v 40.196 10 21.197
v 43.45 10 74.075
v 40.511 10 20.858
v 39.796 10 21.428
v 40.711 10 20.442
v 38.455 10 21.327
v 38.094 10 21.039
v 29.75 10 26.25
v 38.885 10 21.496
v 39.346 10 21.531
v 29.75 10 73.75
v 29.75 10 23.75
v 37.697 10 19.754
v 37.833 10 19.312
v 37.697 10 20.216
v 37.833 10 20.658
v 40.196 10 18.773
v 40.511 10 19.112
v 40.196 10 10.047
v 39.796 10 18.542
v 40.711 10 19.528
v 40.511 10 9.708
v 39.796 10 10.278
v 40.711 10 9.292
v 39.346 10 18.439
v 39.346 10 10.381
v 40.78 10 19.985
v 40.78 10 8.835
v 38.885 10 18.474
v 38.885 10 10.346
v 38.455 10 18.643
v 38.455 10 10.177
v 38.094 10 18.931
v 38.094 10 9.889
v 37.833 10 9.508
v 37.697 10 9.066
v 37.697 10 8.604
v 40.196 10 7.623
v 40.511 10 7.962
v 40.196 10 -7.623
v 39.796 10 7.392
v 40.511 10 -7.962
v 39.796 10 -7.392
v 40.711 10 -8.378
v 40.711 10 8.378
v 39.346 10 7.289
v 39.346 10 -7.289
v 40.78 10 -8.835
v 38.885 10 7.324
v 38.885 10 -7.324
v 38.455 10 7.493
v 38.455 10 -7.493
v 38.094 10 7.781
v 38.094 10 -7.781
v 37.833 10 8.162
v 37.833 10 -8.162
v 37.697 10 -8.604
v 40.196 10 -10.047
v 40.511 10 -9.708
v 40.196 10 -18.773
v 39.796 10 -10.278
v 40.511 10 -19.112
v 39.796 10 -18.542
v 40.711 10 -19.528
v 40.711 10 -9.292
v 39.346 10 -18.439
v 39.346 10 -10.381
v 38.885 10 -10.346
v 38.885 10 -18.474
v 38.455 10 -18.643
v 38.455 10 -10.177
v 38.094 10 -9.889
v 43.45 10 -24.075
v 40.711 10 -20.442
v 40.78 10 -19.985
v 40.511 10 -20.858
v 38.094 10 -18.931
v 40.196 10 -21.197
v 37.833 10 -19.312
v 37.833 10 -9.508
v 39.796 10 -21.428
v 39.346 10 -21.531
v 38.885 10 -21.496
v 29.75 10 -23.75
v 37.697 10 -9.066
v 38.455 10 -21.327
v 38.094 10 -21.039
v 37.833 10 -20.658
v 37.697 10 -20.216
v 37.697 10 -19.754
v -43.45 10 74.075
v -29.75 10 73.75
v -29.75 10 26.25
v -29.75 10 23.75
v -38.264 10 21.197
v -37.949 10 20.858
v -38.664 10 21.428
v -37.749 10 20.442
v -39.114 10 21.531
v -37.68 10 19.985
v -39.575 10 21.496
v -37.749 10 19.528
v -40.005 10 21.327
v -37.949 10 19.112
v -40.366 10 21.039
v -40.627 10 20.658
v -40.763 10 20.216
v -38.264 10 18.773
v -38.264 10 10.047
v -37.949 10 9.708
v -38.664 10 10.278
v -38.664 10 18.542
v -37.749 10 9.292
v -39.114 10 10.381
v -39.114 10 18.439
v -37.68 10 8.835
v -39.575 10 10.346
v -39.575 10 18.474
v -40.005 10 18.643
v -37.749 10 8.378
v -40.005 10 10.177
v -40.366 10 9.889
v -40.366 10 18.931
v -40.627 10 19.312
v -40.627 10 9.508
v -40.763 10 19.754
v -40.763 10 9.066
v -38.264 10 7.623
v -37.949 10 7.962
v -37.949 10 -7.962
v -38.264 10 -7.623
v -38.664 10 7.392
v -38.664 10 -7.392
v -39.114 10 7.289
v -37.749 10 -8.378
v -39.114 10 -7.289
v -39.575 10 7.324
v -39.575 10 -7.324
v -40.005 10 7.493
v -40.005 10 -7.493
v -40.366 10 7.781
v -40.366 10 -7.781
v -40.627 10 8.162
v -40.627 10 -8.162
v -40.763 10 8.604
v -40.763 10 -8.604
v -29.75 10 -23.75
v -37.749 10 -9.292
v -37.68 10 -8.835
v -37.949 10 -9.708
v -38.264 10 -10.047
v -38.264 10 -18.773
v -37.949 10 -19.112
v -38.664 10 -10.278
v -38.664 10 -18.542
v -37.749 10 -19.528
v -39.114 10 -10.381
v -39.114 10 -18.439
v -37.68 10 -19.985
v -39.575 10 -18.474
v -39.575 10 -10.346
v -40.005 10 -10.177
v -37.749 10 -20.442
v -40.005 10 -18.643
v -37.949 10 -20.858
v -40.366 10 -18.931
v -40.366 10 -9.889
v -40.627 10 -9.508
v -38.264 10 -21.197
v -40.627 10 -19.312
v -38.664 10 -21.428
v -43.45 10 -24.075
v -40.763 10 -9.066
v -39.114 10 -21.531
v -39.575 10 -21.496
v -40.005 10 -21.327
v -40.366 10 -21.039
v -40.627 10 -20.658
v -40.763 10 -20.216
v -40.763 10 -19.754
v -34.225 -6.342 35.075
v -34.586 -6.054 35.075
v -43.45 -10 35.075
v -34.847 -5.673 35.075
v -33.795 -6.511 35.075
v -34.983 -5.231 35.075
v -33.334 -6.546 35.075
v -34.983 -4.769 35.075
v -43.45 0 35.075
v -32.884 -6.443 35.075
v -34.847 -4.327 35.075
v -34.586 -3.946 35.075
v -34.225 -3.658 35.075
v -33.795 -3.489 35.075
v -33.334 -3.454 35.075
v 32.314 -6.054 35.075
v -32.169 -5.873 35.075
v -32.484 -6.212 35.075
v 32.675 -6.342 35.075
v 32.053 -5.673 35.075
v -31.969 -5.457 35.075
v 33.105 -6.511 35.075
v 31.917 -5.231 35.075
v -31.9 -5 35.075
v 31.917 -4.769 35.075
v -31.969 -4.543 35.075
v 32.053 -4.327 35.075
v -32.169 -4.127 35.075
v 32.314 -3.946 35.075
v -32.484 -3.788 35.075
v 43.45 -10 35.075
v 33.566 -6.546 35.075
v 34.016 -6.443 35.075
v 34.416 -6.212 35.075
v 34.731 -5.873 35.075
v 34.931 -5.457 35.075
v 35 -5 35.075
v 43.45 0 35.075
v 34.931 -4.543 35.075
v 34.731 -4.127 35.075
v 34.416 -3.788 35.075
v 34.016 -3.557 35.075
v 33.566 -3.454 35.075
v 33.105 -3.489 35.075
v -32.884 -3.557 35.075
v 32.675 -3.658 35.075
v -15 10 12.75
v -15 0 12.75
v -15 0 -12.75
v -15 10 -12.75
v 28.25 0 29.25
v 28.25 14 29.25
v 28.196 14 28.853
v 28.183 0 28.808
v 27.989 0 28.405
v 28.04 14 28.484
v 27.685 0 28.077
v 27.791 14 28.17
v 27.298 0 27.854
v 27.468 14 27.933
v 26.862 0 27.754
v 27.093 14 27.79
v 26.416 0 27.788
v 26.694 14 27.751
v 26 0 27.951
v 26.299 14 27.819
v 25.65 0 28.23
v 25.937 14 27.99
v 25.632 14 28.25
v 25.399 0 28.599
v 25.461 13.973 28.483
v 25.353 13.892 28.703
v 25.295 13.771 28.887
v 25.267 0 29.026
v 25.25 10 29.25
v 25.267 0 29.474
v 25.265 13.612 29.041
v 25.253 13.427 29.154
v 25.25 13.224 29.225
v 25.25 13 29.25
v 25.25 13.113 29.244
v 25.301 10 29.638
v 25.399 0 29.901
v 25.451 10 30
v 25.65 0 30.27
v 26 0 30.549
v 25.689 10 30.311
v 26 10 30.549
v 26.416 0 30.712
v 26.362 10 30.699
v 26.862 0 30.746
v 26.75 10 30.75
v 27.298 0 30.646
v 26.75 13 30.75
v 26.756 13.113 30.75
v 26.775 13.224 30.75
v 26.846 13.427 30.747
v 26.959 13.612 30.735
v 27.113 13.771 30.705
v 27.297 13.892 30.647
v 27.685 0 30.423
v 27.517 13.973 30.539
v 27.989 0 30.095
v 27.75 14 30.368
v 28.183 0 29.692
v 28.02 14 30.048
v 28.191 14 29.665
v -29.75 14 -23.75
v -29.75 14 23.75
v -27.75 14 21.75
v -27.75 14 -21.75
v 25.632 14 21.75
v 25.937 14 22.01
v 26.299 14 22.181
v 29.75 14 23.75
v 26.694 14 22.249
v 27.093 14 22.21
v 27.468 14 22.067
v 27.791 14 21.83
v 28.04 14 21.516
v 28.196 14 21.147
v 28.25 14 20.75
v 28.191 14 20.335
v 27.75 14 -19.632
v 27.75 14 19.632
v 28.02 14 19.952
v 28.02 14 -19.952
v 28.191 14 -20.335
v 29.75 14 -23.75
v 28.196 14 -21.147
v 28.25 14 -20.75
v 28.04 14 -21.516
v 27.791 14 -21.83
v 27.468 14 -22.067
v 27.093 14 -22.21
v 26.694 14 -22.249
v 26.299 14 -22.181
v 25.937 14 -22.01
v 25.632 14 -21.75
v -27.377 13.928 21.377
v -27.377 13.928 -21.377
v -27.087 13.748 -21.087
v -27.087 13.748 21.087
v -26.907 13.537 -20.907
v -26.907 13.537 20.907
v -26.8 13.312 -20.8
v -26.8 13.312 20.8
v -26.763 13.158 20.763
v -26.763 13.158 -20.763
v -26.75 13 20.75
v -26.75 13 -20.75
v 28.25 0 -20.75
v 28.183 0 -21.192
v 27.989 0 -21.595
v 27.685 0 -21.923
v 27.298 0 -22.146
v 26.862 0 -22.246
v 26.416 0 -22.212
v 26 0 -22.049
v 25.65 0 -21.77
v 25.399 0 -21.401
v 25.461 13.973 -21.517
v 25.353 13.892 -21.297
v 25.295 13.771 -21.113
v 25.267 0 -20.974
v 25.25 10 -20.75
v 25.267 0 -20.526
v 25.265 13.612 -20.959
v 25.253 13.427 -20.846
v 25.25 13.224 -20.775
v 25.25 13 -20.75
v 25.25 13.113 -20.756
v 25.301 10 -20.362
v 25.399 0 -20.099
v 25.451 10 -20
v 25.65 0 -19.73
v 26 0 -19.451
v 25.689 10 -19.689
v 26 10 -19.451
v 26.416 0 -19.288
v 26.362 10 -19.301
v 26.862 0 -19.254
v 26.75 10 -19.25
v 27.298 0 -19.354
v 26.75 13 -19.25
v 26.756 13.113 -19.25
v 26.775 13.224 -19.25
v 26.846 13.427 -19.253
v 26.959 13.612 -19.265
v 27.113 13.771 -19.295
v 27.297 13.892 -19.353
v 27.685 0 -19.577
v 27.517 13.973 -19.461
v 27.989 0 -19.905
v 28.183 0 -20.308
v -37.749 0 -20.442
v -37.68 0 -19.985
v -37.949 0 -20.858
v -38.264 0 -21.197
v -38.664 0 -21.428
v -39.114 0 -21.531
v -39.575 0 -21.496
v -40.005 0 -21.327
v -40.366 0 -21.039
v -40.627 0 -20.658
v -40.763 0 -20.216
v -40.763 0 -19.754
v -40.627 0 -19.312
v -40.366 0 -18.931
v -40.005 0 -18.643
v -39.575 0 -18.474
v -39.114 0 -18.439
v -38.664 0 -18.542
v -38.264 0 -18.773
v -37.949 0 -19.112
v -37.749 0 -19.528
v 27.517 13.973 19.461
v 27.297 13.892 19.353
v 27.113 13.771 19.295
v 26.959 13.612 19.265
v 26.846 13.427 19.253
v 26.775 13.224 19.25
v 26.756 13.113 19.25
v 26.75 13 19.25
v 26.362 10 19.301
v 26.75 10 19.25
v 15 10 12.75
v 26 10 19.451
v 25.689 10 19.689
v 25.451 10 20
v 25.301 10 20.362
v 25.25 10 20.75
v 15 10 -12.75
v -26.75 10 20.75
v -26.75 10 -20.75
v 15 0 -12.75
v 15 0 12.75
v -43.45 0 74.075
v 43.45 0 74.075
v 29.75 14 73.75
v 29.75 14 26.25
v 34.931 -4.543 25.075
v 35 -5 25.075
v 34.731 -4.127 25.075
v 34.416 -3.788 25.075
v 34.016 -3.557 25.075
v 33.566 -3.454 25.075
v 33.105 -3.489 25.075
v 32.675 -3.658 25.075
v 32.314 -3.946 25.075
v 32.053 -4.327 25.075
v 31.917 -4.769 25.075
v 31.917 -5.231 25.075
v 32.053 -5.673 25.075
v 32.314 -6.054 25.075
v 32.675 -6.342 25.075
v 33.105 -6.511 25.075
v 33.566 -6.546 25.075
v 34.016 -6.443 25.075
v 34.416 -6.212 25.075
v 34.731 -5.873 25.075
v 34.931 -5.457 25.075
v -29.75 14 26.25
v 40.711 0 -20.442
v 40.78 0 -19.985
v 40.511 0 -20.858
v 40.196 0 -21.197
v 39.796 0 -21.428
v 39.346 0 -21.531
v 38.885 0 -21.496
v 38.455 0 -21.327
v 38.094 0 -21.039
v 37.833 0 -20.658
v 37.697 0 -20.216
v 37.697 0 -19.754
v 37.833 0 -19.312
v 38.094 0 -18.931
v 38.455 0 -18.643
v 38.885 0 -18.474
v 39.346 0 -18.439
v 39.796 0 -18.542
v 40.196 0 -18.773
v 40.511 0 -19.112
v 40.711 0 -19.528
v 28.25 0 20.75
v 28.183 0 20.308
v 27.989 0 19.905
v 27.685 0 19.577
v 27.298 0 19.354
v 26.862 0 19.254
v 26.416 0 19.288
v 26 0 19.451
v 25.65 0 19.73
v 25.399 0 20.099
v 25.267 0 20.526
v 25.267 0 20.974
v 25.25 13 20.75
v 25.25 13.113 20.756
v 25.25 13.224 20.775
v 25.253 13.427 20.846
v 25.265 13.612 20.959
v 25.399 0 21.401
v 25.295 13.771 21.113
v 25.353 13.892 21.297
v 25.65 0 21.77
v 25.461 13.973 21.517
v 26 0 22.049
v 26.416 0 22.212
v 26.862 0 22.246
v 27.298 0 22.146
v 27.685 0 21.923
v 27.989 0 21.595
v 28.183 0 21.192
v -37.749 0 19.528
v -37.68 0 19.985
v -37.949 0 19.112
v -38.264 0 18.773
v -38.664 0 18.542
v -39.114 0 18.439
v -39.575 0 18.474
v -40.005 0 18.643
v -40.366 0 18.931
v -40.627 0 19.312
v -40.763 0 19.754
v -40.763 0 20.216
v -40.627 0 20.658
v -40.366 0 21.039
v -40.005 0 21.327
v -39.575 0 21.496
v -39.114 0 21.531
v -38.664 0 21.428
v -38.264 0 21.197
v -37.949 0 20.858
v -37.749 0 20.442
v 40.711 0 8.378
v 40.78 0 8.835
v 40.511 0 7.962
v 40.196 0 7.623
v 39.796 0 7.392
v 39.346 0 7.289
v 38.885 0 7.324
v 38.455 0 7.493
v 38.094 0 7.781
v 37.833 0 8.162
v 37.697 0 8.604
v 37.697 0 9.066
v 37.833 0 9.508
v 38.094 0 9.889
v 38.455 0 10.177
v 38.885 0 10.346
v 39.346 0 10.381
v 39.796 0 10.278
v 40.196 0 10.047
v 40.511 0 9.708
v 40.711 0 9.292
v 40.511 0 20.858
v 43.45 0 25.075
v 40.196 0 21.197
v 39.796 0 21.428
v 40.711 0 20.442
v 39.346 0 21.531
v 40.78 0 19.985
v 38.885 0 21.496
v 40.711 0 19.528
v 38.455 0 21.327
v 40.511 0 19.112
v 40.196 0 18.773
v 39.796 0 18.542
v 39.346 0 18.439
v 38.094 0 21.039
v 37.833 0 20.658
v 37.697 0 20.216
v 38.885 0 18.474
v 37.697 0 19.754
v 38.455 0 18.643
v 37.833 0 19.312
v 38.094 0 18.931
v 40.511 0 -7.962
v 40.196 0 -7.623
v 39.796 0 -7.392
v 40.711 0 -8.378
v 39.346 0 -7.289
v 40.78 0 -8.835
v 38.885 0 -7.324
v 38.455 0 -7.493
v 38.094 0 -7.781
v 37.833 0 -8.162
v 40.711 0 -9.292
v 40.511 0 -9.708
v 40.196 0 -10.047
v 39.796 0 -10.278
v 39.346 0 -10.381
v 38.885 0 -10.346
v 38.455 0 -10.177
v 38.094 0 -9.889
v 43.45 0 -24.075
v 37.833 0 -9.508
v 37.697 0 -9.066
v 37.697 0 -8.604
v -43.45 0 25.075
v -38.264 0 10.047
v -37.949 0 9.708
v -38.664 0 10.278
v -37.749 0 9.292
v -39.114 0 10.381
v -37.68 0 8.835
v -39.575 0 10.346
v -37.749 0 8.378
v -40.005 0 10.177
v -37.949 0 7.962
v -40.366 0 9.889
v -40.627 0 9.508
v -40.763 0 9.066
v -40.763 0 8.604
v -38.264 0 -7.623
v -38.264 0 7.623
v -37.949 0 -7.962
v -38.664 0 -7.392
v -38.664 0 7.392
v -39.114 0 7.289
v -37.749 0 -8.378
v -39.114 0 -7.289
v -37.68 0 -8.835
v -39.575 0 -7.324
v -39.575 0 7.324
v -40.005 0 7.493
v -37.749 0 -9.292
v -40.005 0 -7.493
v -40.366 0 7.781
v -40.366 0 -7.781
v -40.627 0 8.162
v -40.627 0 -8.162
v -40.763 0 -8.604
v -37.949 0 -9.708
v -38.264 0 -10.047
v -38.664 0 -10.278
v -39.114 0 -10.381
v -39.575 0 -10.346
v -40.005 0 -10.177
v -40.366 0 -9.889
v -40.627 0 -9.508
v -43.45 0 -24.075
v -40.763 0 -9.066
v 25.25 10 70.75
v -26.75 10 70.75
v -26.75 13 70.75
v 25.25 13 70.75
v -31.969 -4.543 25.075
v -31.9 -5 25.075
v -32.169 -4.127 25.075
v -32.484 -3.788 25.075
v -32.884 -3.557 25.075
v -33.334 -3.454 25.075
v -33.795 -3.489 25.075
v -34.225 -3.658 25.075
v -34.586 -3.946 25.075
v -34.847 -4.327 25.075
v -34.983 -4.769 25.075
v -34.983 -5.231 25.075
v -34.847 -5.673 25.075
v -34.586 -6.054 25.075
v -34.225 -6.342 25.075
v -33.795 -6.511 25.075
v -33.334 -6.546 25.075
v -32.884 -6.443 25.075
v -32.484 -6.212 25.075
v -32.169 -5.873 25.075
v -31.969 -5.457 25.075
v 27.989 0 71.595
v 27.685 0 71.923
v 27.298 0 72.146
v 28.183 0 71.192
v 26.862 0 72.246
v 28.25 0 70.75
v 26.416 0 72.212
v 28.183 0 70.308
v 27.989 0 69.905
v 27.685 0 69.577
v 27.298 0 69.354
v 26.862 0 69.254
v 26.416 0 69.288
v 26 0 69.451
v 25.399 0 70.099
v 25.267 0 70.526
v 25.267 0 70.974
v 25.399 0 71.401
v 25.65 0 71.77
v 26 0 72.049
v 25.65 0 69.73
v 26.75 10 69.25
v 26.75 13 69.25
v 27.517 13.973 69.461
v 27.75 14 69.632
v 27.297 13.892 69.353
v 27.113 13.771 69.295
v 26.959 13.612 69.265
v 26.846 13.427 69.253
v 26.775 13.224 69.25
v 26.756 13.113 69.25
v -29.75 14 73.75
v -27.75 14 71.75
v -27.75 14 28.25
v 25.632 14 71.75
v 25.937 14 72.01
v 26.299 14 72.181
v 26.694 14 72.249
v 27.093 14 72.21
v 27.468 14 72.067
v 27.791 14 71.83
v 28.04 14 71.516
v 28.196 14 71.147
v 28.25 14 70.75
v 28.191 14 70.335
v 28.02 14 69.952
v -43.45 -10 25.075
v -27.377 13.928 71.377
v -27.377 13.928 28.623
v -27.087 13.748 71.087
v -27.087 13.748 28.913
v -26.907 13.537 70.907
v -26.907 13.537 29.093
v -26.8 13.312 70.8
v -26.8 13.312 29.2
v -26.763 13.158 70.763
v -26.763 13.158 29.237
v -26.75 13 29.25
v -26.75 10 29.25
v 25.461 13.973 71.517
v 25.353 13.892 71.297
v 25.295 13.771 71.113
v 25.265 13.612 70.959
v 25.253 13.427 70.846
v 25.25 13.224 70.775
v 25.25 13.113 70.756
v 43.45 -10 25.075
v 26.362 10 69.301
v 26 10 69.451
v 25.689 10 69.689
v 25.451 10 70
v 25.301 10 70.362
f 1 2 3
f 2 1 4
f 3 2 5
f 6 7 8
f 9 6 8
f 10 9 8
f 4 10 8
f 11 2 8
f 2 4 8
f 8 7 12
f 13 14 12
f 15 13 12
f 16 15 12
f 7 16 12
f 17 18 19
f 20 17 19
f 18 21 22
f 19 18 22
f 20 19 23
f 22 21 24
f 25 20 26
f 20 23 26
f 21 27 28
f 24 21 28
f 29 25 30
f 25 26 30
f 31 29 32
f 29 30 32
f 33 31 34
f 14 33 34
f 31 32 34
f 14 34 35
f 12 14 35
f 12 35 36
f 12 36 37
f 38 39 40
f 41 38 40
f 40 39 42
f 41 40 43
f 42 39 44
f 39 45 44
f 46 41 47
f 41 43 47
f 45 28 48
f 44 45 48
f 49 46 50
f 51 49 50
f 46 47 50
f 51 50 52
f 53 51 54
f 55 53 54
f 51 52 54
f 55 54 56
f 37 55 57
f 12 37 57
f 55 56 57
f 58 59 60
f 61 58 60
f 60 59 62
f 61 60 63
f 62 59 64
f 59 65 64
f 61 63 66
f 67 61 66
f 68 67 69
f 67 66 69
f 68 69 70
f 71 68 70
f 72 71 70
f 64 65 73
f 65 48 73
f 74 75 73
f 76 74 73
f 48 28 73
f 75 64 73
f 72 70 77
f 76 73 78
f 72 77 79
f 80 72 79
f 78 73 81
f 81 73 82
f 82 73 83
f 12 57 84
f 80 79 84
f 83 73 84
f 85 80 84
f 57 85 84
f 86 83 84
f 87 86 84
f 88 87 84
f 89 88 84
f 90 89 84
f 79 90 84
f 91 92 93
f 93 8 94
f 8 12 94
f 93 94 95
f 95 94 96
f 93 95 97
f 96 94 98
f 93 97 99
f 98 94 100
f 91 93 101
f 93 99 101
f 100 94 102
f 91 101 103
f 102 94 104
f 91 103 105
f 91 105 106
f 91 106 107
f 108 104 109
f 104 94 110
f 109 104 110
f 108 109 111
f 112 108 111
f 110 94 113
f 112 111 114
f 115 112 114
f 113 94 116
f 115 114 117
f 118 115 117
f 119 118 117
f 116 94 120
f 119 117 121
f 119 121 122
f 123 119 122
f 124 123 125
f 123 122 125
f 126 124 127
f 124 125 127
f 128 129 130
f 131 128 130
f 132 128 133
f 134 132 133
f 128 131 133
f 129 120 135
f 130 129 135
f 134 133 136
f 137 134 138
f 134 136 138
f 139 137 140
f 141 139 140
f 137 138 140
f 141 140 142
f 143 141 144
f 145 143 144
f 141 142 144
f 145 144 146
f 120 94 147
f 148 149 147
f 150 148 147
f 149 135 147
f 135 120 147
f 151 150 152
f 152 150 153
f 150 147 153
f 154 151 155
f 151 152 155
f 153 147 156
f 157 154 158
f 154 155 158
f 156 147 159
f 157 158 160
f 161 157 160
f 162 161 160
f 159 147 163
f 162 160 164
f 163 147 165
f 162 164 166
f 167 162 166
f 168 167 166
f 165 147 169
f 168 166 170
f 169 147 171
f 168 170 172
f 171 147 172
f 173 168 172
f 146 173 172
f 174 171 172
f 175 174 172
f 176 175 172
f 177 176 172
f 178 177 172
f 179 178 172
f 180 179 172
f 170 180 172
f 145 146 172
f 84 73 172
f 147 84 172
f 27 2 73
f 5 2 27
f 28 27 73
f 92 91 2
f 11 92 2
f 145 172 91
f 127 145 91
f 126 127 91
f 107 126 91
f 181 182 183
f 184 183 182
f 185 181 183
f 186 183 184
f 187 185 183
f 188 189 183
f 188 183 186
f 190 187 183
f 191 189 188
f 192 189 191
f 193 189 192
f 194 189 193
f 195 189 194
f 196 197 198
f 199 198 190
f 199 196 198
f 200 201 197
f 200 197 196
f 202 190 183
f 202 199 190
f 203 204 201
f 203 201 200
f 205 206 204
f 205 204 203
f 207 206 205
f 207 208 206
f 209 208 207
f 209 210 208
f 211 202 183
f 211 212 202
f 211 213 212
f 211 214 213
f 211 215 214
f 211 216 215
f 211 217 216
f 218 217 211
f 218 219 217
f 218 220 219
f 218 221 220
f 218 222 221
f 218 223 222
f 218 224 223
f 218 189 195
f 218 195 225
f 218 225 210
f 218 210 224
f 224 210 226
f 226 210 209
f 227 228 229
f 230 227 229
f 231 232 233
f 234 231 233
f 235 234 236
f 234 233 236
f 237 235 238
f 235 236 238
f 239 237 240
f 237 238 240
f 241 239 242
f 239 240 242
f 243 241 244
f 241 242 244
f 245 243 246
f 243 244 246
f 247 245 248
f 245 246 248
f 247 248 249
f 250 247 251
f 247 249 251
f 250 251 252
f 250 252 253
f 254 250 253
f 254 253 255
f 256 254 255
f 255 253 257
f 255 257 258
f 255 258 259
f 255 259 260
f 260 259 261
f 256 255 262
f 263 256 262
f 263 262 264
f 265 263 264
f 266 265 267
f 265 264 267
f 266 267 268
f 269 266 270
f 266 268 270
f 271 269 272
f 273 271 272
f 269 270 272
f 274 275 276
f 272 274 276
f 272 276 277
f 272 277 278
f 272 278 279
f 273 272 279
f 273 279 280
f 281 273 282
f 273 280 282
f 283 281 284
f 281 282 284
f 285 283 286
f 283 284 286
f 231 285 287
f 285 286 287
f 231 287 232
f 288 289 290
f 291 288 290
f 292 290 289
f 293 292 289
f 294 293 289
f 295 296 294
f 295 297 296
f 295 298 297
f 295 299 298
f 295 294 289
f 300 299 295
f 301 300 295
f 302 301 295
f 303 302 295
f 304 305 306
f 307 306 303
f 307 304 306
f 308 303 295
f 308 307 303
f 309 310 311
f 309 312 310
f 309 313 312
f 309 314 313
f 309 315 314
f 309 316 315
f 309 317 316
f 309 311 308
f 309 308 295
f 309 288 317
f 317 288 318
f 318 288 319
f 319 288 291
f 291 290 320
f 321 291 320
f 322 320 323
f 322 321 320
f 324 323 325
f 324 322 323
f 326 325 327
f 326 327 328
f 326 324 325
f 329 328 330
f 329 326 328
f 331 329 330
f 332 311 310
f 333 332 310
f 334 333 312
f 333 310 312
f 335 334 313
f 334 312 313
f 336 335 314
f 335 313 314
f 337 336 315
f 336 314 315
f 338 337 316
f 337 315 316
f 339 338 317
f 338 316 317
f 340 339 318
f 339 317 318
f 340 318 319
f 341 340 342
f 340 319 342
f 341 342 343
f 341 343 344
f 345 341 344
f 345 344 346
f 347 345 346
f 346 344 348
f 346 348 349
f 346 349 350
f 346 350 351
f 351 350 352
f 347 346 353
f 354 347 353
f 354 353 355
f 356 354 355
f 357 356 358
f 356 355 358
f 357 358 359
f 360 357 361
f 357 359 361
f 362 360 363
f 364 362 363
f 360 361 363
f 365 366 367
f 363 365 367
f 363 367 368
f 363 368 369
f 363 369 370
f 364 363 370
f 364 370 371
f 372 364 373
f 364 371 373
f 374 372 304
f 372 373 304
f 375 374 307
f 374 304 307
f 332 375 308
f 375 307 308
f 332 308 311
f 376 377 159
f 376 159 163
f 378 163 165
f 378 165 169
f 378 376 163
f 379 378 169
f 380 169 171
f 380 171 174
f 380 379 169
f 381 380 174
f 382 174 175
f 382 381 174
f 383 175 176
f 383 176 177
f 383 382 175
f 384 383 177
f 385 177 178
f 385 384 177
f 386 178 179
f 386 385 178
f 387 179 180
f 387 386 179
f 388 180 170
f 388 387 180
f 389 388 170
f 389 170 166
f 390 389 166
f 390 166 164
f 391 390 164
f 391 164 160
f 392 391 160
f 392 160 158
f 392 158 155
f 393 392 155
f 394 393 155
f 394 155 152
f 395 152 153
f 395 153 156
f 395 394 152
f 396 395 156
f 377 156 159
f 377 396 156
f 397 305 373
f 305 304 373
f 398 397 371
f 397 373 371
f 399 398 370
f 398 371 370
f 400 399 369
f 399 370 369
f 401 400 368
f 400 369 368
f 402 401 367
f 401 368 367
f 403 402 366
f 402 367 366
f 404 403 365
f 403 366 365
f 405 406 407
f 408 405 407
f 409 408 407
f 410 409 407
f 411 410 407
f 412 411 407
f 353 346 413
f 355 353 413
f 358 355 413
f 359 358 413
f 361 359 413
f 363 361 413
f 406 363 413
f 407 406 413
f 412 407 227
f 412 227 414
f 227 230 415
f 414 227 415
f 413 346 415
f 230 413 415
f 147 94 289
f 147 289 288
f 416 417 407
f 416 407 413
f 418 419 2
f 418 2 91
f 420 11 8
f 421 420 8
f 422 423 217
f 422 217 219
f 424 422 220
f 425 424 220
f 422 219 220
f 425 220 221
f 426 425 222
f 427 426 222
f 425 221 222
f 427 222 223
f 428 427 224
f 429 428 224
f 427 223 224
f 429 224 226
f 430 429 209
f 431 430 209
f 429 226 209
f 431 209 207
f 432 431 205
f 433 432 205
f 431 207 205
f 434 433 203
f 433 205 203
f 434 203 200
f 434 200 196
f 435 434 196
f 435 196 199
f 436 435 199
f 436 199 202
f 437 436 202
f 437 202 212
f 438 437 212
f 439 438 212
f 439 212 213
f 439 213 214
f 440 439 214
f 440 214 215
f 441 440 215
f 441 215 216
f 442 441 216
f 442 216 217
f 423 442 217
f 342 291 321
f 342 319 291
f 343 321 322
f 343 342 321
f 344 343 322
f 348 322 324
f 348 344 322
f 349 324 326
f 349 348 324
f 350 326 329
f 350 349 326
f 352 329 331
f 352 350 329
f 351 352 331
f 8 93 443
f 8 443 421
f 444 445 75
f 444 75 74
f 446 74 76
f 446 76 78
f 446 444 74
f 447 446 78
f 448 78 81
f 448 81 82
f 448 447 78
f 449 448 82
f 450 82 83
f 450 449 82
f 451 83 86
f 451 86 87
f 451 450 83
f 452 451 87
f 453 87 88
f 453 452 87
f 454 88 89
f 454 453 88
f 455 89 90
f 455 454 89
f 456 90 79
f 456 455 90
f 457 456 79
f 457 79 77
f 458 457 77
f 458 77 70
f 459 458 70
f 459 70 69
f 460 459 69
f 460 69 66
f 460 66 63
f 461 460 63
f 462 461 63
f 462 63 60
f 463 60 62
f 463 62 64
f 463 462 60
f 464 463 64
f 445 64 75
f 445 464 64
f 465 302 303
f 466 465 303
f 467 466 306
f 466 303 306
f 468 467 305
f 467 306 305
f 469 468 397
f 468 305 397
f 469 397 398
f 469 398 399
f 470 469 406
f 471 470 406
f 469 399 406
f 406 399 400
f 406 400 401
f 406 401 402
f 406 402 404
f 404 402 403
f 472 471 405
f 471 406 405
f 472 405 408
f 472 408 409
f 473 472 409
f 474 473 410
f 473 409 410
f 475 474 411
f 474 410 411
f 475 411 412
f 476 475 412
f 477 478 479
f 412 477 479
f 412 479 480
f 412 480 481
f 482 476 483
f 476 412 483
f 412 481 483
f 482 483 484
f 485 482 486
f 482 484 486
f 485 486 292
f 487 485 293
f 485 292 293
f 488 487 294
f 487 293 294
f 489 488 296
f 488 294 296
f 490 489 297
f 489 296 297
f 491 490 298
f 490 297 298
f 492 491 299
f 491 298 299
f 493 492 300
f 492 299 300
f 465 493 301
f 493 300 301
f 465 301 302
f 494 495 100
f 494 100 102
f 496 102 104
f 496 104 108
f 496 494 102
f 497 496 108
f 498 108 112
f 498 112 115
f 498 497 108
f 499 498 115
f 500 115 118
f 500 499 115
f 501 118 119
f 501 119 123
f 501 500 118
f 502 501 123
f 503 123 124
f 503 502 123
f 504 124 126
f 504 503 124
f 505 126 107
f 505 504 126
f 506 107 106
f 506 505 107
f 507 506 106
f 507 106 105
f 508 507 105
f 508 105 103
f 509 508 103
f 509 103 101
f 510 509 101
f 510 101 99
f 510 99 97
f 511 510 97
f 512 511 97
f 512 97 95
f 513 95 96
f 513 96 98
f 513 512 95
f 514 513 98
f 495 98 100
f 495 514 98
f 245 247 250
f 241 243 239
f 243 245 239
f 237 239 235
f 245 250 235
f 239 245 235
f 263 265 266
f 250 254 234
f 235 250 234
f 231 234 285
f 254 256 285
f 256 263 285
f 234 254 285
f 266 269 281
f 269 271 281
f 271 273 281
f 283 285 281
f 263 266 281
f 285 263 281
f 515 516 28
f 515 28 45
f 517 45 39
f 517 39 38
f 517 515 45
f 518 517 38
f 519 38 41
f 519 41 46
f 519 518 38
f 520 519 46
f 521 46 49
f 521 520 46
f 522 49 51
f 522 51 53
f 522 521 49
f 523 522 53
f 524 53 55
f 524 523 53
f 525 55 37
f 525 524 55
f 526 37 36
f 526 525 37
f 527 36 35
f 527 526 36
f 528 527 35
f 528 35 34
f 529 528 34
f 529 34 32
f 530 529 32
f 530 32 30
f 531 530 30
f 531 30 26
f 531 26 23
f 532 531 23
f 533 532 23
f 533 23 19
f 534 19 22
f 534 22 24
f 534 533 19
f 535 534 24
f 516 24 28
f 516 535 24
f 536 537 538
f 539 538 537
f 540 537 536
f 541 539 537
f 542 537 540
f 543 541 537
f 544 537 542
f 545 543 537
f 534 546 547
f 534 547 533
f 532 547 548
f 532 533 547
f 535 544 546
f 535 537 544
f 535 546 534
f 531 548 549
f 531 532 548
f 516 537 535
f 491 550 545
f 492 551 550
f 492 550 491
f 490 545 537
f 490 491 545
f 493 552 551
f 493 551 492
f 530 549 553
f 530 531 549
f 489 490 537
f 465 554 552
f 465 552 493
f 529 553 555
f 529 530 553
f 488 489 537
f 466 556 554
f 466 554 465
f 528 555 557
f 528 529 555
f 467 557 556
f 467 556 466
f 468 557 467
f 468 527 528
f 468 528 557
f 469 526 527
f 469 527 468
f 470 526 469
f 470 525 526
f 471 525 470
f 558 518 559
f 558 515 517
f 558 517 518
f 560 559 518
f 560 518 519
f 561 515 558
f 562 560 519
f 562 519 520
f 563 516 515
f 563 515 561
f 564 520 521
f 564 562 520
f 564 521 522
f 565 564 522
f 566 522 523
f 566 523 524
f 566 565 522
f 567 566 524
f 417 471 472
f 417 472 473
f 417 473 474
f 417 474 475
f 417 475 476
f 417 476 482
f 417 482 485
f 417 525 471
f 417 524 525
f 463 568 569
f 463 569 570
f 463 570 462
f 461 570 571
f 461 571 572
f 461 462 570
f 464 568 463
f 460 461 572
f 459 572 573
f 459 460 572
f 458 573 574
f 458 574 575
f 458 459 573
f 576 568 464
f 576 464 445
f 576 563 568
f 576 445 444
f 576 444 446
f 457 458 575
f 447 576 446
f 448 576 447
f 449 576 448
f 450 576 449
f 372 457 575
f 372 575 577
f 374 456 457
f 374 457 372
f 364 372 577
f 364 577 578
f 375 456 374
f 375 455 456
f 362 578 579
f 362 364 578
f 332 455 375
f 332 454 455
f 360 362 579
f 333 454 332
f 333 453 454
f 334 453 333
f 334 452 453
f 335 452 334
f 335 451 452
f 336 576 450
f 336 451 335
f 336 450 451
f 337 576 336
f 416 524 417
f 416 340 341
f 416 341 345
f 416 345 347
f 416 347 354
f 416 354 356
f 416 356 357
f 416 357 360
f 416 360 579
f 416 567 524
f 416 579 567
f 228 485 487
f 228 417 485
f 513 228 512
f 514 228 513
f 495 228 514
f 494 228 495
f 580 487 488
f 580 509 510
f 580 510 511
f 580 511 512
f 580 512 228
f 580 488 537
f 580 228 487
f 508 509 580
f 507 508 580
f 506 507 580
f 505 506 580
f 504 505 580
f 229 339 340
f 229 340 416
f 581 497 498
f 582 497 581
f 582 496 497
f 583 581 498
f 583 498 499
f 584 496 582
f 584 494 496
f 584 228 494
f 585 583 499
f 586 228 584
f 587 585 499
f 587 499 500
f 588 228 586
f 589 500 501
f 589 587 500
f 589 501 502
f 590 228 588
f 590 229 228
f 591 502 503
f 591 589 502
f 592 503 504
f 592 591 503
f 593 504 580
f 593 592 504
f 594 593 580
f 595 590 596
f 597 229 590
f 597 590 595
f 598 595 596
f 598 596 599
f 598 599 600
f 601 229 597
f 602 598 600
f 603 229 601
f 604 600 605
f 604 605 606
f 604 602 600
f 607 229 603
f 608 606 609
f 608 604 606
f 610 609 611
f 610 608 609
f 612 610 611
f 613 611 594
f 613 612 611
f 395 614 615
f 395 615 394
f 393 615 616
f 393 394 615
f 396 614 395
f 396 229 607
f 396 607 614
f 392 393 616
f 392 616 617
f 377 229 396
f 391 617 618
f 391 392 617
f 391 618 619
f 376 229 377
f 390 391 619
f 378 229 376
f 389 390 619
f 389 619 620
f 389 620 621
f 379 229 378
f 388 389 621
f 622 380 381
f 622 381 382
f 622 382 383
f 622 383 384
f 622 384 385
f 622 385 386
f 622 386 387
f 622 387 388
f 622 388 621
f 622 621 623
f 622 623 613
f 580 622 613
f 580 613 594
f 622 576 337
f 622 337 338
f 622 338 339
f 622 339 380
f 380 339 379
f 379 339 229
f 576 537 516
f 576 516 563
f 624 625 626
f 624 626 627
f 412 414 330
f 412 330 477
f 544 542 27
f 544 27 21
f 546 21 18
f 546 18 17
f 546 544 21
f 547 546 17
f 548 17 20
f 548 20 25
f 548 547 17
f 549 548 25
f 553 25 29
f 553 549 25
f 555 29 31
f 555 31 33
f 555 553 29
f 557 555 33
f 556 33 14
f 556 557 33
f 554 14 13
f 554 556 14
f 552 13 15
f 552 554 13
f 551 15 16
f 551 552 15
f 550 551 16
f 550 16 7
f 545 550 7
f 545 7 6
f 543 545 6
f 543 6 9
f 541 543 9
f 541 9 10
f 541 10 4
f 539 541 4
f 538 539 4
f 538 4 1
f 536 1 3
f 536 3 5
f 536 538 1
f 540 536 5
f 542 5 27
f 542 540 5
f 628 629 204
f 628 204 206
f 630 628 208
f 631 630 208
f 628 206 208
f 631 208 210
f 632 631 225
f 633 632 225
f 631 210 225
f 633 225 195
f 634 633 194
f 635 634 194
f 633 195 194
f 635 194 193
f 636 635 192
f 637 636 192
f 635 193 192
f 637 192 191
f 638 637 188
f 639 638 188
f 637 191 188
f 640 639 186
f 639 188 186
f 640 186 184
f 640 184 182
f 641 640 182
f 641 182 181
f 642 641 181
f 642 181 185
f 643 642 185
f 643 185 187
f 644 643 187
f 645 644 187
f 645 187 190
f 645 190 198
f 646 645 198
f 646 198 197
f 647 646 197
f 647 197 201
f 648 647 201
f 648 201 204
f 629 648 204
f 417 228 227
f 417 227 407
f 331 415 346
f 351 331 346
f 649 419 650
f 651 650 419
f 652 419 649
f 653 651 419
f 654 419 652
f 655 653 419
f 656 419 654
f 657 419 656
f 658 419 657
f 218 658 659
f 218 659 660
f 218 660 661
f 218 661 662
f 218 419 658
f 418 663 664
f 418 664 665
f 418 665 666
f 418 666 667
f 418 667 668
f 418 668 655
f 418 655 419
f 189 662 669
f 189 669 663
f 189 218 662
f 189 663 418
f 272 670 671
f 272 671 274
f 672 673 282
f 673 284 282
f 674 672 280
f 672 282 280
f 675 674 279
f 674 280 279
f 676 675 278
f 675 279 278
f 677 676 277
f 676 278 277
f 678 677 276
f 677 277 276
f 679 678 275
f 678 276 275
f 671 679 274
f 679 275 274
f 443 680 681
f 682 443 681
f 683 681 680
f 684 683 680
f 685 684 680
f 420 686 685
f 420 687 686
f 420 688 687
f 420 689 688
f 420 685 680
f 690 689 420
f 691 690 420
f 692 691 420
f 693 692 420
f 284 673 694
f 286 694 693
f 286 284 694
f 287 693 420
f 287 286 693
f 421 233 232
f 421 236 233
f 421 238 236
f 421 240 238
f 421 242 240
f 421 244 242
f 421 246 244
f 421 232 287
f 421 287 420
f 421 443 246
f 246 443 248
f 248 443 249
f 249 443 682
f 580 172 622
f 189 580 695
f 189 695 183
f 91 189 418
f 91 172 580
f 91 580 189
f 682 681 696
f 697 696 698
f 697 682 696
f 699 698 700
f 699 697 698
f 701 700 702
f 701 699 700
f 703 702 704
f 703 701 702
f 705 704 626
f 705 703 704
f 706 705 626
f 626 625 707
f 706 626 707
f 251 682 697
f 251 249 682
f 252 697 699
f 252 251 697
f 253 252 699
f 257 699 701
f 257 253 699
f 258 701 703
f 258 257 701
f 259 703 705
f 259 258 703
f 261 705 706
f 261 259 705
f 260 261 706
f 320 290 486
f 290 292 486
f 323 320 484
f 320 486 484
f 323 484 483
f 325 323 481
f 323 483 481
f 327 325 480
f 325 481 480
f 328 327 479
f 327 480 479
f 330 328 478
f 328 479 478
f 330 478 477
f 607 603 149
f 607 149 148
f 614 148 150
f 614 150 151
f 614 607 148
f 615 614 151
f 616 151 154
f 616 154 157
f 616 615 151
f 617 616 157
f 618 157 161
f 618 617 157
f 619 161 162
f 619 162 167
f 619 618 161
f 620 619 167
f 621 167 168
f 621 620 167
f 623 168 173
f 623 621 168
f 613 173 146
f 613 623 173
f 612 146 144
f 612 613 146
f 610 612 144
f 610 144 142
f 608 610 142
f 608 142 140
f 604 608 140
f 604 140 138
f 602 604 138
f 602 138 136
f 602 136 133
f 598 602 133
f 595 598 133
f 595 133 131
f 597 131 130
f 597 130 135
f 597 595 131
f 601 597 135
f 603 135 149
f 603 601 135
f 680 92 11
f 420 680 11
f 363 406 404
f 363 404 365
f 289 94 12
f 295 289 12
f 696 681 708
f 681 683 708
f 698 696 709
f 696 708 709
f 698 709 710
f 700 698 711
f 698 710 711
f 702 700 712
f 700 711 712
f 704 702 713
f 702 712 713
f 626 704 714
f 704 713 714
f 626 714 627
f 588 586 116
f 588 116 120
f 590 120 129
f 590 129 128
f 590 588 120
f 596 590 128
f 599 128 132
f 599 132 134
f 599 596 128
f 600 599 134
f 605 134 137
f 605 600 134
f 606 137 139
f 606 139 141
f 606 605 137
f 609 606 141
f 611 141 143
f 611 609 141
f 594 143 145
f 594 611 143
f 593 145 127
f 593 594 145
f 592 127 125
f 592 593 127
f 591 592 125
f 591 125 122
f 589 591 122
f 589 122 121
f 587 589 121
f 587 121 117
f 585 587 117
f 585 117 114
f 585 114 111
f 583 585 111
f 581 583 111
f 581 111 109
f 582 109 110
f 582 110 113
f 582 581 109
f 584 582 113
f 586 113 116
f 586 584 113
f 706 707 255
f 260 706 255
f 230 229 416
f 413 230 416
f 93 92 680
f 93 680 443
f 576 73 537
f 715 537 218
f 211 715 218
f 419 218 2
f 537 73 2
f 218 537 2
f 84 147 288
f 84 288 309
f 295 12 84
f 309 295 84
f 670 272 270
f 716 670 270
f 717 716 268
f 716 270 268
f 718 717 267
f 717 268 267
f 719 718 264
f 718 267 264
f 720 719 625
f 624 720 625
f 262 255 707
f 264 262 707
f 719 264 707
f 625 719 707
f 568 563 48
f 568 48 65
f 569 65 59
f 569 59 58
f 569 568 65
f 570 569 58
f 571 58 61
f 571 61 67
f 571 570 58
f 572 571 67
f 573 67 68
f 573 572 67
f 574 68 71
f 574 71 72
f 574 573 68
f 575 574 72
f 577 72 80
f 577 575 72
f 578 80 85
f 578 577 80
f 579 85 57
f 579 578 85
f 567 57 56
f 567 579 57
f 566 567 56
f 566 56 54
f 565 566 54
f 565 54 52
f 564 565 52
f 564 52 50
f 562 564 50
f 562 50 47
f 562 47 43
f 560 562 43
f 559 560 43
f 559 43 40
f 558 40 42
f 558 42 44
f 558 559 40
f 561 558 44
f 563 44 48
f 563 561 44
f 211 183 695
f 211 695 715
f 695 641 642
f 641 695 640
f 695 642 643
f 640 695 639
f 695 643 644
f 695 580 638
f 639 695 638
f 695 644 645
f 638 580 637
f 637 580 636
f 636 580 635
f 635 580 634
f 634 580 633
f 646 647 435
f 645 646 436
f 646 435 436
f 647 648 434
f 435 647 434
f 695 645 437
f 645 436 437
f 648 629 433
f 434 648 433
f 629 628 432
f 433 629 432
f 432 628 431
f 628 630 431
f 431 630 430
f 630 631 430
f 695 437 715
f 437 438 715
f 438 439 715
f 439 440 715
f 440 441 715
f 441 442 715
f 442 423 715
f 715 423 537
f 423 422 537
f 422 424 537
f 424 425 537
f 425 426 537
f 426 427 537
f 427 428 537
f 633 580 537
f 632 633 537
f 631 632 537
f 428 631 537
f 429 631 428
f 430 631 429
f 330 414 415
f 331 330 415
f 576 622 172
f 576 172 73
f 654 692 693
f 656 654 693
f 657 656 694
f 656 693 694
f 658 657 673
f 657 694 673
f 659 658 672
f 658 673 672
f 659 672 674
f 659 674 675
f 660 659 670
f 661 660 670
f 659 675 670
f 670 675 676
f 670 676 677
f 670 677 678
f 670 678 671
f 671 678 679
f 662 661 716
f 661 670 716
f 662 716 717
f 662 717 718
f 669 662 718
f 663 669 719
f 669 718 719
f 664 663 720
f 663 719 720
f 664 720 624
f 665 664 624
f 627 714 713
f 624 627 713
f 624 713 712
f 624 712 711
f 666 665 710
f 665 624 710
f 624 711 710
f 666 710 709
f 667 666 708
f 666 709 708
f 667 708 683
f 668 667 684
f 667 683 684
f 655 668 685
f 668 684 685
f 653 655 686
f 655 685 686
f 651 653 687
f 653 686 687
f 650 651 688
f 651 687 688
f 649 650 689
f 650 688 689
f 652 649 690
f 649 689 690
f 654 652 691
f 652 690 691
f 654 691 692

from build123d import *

# Parameters (mm, degrees)
SKETCH1_R           = 1.55
SKETCH1_W           = 30
SKETCH1_H           = 25.5
BOSS_EXTRUDE1_DEPTH = 10
SKETCH2_W           = 59.5
SKETCH2_H           = 47.5
SKETCH2_W_2         = 53.5
SKETCH2_H_2         = 41.5
BOSS_EXTRUDE2_DEPTH = 4
CUT_EXTRUDE1_REACH  = 16
SKETCH3_R           = 1.5
FILLET2_R           = 1
SKETCH6_W           = 86.9
SKETCH6_H           = 10
BOSS_EXTRUDE3_DEPTH = 10
CUT_EXTRUDE2_REACH  = 61.15
SKETCH7_R           = 1.55


with BuildPart() as part:
    # Sketch1 → Boss-Extrude1 (new body)
    with BuildSketch(Plane(origin=(0, 0, 0), x_dir=(1, 0, 0), z_dir=(0, 1, 0))):
        Polygon((-43.45, 24.075), (43.45, 24.075), (43.45, -24.075), (43.45, -74.075), (-43.45, -74.075), (-43.45, -24.075), align=None)
        with Locations((-39.23, 19.985)):
            Circle(SKETCH1_R, mode=Mode.SUBTRACT)
        with Locations((-39.23, 8.835)):
            Circle(SKETCH1_R, mode=Mode.SUBTRACT)
        with Locations((-39.23, -8.835)):
            Circle(SKETCH1_R, mode=Mode.SUBTRACT)
        with Locations((-39.23, -19.985)):
            Circle(SKETCH1_R, mode=Mode.SUBTRACT)
        with Locations((39.23, -19.985)):
            Circle(SKETCH1_R, mode=Mode.SUBTRACT)
        with Locations((39.23, -8.835)):
            Circle(SKETCH1_R, mode=Mode.SUBTRACT)
        with Locations((39.23, 8.835)):
            Circle(SKETCH1_R, mode=Mode.SUBTRACT)
        with Locations((39.23, 19.985)):
            Circle(SKETCH1_R, mode=Mode.SUBTRACT)
        Rectangle(SKETCH1_W, SKETCH1_H, mode=Mode.SUBTRACT)
    extrude(amount=BOSS_EXTRUDE1_DEPTH)

    # Sketch2 → Boss-Extrude2 (add)
    with BuildSketch(Plane(origin=(0, 10, 0), x_dir=(1, 0, 0), z_dir=(0, 1, 0))):
        with Locations((0, -50)):
            Rectangle(SKETCH2_W, SKETCH2_H)
        with Locations((0, -50)):
            Rectangle(SKETCH2_W_2, SKETCH2_H_2, mode=Mode.SUBTRACT)
        Rectangle(SKETCH2_W, SKETCH2_H)
        Rectangle(SKETCH2_W_2, SKETCH2_H_2, mode=Mode.SUBTRACT)
    extrude(amount=BOSS_EXTRUDE2_DEPTH)

    # Sketch3 → Cut-Extrude1 (cut, up to next)
    with BuildSketch(Plane(origin=(0, 14, 0), x_dir=(1, 0, 0), z_dir=(0, 1, 0)), mode=Mode.PRIVATE) as cut_extrude1_sk1:
        with Locations((26.75, 20.75)):
            Circle(SKETCH3_R)
    cut_extrude1_tool1 = extrude(cut_extrude1_sk1.sketch, amount=-CUT_EXTRUDE1_REACH, mode=Mode.PRIVATE) & part.part
    add(cut_extrude1_tool1.solids().sort_by_distance((26.75, 14, -20.75))[0], mode=Mode.SUBTRACT)
    # Sketch3 → Cut-Extrude1 (cut, up to next)
    with BuildSketch(Plane(origin=(0, 14, 0), x_dir=(1, 0, 0), z_dir=(0, 1, 0)), mode=Mode.PRIVATE) as cut_extrude1_sk2:
        with Locations((26.75, -20.75)):
            Circle(SKETCH3_R)
    cut_extrude1_tool2 = extrude(cut_extrude1_sk2.sketch, amount=-CUT_EXTRUDE1_REACH, mode=Mode.PRIVATE) & part.part
    add(cut_extrude1_tool2.solids().sort_by_distance((26.75, 14, 20.75))[0], mode=Mode.SUBTRACT)
    # Sketch3 → Cut-Extrude1 (cut, up to next)
    with BuildSketch(Plane(origin=(0, 14, 0), x_dir=(1, 0, 0), z_dir=(0, 1, 0)), mode=Mode.PRIVATE) as cut_extrude1_sk3:
        with Locations((26.75, -29.25)):
            Circle(SKETCH3_R)
    cut_extrude1_tool3 = extrude(cut_extrude1_sk3.sketch, amount=-CUT_EXTRUDE1_REACH, mode=Mode.PRIVATE) & part.part
    add(cut_extrude1_tool3.solids().sort_by_distance((26.75, 14, 29.25))[0], mode=Mode.SUBTRACT)
    # Sketch3 → Cut-Extrude1 (cut, up to next)
    with BuildSketch(Plane(origin=(0, 14, 0), x_dir=(1, 0, 0), z_dir=(0, 1, 0)), mode=Mode.PRIVATE) as cut_extrude1_sk4:
        with Locations((26.75, -70.75)):
            Circle(SKETCH3_R)
    cut_extrude1_tool4 = extrude(cut_extrude1_sk4.sketch, amount=-CUT_EXTRUDE1_REACH, mode=Mode.PRIVATE) & part.part
    add(cut_extrude1_tool4.solids().sort_by_distance((26.75, 14, 70.75))[0], mode=Mode.SUBTRACT)

    # Fillet2
    fillet2_edges = [part.edges().sort_by_distance(p)[0] for p in [
        (-26.75, 14, 50),
        (-0.75, 14, 29.25),
        (26.75, 14, 50),
        (-0.75, 14, -20.75),
        (26.75, 14, 0),
        (-26.75, 14, 0),
        (-0.75, 14, 20.75),
        (-0.75, 14, 70.75),
    ]]
    fillet(fillet2_edges, radius=FILLET2_R)

    # Sketch6 → Boss-Extrude3 (add)
    with BuildSketch(Plane.XZ):
        with Locations((0, 30.075)):
            Rectangle(SKETCH6_W, SKETCH6_H)
    extrude(amount=BOSS_EXTRUDE3_DEPTH)

    # Sketch7 → Cut-Extrude2 (cut, up to next)
    with BuildSketch(Plane.XY.offset(35.075), mode=Mode.PRIVATE) as cut_extrude2_sk1:
        with Locations((-33.45, -5)):
            Circle(SKETCH7_R)
    cut_extrude2_tool1 = extrude(cut_extrude2_sk1.sketch, amount=-CUT_EXTRUDE2_REACH, mode=Mode.PRIVATE) & part.part
    add(cut_extrude2_tool1.solids().sort_by_distance((-33.45, -5, 35.075))[0], mode=Mode.SUBTRACT)
    # Sketch7 → Cut-Extrude2 (cut, up to next)
    with BuildSketch(Plane.XY.offset(35.075), mode=Mode.PRIVATE) as cut_extrude2_sk2:
        with Locations((33.45, -5)):
            Circle(SKETCH7_R)
    cut_extrude2_tool2 = extrude(cut_extrude2_sk2.sketch, amount=-CUT_EXTRUDE2_REACH, mode=Mode.PRIVATE) & part.part
    add(cut_extrude2_tool2.solids().sort_by_distance((33.45, -5, 35.075))[0], mode=Mode.SUBTRACT)


solid = part.part
